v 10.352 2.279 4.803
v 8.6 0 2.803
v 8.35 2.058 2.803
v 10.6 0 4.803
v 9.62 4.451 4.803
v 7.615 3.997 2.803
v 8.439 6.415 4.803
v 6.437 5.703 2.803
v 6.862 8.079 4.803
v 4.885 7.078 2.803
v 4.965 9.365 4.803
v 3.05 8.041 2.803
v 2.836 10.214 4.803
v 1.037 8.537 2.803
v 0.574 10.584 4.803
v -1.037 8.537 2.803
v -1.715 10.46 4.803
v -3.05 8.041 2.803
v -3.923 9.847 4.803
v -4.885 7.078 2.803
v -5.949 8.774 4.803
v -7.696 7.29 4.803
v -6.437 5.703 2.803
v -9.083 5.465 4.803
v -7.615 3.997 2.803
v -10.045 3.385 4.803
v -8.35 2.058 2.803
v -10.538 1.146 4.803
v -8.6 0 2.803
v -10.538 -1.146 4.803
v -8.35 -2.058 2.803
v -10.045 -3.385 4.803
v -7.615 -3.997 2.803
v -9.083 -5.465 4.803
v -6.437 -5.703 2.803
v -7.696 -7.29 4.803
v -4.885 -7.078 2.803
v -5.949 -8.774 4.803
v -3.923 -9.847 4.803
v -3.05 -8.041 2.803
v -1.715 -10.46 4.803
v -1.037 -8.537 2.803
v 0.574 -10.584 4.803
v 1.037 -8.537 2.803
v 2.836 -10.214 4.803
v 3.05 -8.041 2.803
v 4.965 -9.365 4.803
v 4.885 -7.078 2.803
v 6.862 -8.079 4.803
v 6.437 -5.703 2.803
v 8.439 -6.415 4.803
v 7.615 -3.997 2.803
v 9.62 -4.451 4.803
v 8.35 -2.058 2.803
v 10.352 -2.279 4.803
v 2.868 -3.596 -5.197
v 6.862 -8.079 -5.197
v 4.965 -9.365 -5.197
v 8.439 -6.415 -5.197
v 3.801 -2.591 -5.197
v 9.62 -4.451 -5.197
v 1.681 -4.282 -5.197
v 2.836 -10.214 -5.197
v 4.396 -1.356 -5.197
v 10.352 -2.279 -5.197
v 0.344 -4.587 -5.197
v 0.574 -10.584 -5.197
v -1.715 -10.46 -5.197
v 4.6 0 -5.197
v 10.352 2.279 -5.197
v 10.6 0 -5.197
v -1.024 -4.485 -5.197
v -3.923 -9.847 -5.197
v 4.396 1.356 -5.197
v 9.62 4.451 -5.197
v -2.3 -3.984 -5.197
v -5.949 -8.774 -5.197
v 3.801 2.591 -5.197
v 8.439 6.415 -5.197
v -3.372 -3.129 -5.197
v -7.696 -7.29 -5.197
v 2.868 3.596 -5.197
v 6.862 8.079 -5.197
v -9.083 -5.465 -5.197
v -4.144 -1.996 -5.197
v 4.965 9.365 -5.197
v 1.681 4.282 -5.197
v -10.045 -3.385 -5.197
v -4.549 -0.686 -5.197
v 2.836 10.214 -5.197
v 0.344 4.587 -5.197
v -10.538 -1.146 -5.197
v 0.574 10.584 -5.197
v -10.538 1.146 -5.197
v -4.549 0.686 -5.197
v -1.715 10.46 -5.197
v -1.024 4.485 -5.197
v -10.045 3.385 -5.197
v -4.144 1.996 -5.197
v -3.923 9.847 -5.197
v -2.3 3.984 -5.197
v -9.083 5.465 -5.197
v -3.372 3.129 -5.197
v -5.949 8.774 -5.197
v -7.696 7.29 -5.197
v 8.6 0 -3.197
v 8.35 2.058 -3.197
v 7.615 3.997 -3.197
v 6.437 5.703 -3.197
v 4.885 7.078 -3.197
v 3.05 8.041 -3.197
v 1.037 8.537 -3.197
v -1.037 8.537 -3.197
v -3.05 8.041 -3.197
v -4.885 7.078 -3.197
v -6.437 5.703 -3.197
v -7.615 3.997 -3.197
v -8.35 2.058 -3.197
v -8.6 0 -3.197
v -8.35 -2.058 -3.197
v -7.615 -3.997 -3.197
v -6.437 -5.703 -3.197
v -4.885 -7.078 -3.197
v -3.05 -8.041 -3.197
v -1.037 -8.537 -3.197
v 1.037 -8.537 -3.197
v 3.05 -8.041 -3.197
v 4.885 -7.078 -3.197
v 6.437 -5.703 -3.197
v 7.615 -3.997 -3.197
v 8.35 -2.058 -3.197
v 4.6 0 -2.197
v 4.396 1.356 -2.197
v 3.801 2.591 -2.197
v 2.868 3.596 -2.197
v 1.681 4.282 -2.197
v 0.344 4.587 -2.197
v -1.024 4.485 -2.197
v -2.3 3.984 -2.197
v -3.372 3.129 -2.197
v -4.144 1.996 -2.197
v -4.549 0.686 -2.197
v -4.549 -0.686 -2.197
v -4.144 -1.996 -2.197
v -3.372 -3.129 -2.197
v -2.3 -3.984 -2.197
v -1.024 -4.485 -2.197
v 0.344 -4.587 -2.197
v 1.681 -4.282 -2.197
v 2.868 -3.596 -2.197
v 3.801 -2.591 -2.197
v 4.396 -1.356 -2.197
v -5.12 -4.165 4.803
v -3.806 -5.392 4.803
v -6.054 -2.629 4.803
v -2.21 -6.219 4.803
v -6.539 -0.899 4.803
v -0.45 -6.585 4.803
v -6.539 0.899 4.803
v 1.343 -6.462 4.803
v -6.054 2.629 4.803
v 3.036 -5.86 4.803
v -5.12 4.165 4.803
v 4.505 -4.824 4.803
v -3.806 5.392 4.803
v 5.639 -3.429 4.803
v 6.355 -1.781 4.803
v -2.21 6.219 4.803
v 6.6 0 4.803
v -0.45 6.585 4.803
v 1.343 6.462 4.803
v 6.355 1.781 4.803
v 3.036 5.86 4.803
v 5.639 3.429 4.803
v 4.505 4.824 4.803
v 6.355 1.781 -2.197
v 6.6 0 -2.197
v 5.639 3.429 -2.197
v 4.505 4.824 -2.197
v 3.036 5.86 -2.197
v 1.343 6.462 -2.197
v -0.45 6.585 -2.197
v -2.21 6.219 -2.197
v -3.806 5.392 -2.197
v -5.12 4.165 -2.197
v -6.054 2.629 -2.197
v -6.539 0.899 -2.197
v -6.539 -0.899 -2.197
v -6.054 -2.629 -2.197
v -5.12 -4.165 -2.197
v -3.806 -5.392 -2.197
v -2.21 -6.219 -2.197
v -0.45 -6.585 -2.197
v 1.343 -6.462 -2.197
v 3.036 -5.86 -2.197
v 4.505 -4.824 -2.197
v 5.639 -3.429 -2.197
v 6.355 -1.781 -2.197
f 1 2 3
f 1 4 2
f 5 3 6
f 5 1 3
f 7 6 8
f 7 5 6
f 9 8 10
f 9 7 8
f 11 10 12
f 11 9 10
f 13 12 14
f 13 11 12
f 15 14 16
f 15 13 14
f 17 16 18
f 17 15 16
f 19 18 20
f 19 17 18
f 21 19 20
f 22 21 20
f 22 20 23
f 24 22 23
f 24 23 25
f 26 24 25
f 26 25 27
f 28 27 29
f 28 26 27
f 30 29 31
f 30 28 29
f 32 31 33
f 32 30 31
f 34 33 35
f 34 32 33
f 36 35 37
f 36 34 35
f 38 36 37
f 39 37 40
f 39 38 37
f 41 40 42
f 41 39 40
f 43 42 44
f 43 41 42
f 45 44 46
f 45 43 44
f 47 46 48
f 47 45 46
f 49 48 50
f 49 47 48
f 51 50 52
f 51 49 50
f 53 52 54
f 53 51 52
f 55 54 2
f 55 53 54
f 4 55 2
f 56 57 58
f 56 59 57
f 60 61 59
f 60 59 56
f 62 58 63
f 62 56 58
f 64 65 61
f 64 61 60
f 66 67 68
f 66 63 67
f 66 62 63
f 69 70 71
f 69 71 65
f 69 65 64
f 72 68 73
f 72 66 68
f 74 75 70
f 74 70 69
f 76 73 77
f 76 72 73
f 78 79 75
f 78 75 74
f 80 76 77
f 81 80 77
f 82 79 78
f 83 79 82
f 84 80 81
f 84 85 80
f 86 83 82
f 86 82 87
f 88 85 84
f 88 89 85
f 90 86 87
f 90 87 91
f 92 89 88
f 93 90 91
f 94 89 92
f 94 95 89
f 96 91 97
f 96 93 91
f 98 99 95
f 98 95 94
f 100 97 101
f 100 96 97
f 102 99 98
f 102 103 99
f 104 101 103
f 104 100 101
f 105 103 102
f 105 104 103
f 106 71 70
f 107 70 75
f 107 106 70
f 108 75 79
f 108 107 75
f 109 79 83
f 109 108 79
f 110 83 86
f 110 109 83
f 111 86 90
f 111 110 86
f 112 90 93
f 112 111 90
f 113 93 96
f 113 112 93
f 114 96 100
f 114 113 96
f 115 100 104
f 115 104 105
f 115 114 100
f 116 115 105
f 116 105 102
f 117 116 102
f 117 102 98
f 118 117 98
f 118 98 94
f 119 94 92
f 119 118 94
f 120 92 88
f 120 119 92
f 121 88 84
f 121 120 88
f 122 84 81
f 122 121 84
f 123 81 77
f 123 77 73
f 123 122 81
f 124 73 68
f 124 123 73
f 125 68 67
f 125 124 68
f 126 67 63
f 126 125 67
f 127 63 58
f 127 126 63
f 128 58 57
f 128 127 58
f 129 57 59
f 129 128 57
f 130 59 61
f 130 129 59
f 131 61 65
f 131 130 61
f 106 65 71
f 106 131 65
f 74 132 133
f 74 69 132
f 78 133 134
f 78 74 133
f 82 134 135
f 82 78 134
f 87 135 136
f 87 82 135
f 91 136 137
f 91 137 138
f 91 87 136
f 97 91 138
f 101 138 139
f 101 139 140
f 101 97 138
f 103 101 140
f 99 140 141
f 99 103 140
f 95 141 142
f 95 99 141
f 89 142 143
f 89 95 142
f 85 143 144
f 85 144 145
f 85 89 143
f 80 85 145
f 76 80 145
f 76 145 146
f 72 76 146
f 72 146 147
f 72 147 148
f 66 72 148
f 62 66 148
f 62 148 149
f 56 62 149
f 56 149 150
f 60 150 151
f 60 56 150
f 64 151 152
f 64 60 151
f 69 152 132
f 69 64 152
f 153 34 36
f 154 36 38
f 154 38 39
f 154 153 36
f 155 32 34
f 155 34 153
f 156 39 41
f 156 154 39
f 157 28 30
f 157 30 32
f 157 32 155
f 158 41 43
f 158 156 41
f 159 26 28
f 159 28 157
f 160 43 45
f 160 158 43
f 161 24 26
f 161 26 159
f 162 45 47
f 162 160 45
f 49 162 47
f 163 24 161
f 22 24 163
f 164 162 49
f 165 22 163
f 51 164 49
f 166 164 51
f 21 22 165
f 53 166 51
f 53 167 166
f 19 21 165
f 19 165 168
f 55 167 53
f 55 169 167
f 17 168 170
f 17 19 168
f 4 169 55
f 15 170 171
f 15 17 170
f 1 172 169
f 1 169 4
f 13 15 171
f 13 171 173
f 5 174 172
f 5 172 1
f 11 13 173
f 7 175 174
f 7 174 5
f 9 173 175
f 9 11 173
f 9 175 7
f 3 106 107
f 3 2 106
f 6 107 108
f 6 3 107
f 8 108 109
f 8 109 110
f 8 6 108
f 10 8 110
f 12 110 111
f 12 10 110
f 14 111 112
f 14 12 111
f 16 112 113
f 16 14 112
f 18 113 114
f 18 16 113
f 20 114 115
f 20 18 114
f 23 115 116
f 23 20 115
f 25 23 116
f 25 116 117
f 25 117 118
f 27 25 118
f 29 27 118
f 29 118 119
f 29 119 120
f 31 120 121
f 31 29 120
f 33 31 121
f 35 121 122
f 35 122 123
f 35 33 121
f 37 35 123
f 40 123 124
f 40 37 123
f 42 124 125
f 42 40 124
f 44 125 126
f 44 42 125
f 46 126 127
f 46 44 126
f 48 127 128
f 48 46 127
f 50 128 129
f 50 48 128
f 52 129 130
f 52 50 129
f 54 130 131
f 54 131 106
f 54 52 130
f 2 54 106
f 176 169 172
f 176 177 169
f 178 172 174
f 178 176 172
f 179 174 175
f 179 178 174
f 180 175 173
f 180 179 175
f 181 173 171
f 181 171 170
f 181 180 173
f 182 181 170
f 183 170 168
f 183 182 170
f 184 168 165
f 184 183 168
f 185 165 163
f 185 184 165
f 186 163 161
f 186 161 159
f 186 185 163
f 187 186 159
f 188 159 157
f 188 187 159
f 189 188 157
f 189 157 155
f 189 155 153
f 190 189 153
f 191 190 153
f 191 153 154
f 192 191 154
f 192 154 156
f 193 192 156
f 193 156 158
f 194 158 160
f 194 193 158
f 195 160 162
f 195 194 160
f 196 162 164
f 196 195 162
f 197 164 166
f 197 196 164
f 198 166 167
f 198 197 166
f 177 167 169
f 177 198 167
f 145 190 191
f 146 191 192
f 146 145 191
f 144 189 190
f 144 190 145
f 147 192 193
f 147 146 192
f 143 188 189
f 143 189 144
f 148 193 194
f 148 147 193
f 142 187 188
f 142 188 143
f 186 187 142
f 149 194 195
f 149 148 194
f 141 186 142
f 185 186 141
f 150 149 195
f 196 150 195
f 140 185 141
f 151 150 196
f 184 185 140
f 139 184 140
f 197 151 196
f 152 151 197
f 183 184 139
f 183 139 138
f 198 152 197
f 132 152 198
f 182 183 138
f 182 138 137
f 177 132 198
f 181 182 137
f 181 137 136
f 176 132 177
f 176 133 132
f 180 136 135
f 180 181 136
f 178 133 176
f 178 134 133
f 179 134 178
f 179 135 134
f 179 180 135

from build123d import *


with BuildPart() as f1:
    # F0 (on Front) → F1 (revolve)
    with BuildSketch(Plane.XZ):
        Polygon((10.6, 4.802996), (6.6, 4.802996), (6.6, 2.802996), (8.6, 2.802996), align=None)
        Polygon((8.6, 2.802996), (6.6, 2.802996), (6.6, -2.197004), (6.6, -3.697004), (6.6, -5.197004), (10.6, -5.197004), (8.6, -3.197004), align=None)
        Polygon((6.6, -3.697004), (6.6, -2.197004), (4.6, -2.197004), (4.6, -5.197004), (6.6, -5.197004), align=None)
    revolve(axis=Axis((0, 0, 0.589413), (0, 0, 1)))


solid = f1.part
